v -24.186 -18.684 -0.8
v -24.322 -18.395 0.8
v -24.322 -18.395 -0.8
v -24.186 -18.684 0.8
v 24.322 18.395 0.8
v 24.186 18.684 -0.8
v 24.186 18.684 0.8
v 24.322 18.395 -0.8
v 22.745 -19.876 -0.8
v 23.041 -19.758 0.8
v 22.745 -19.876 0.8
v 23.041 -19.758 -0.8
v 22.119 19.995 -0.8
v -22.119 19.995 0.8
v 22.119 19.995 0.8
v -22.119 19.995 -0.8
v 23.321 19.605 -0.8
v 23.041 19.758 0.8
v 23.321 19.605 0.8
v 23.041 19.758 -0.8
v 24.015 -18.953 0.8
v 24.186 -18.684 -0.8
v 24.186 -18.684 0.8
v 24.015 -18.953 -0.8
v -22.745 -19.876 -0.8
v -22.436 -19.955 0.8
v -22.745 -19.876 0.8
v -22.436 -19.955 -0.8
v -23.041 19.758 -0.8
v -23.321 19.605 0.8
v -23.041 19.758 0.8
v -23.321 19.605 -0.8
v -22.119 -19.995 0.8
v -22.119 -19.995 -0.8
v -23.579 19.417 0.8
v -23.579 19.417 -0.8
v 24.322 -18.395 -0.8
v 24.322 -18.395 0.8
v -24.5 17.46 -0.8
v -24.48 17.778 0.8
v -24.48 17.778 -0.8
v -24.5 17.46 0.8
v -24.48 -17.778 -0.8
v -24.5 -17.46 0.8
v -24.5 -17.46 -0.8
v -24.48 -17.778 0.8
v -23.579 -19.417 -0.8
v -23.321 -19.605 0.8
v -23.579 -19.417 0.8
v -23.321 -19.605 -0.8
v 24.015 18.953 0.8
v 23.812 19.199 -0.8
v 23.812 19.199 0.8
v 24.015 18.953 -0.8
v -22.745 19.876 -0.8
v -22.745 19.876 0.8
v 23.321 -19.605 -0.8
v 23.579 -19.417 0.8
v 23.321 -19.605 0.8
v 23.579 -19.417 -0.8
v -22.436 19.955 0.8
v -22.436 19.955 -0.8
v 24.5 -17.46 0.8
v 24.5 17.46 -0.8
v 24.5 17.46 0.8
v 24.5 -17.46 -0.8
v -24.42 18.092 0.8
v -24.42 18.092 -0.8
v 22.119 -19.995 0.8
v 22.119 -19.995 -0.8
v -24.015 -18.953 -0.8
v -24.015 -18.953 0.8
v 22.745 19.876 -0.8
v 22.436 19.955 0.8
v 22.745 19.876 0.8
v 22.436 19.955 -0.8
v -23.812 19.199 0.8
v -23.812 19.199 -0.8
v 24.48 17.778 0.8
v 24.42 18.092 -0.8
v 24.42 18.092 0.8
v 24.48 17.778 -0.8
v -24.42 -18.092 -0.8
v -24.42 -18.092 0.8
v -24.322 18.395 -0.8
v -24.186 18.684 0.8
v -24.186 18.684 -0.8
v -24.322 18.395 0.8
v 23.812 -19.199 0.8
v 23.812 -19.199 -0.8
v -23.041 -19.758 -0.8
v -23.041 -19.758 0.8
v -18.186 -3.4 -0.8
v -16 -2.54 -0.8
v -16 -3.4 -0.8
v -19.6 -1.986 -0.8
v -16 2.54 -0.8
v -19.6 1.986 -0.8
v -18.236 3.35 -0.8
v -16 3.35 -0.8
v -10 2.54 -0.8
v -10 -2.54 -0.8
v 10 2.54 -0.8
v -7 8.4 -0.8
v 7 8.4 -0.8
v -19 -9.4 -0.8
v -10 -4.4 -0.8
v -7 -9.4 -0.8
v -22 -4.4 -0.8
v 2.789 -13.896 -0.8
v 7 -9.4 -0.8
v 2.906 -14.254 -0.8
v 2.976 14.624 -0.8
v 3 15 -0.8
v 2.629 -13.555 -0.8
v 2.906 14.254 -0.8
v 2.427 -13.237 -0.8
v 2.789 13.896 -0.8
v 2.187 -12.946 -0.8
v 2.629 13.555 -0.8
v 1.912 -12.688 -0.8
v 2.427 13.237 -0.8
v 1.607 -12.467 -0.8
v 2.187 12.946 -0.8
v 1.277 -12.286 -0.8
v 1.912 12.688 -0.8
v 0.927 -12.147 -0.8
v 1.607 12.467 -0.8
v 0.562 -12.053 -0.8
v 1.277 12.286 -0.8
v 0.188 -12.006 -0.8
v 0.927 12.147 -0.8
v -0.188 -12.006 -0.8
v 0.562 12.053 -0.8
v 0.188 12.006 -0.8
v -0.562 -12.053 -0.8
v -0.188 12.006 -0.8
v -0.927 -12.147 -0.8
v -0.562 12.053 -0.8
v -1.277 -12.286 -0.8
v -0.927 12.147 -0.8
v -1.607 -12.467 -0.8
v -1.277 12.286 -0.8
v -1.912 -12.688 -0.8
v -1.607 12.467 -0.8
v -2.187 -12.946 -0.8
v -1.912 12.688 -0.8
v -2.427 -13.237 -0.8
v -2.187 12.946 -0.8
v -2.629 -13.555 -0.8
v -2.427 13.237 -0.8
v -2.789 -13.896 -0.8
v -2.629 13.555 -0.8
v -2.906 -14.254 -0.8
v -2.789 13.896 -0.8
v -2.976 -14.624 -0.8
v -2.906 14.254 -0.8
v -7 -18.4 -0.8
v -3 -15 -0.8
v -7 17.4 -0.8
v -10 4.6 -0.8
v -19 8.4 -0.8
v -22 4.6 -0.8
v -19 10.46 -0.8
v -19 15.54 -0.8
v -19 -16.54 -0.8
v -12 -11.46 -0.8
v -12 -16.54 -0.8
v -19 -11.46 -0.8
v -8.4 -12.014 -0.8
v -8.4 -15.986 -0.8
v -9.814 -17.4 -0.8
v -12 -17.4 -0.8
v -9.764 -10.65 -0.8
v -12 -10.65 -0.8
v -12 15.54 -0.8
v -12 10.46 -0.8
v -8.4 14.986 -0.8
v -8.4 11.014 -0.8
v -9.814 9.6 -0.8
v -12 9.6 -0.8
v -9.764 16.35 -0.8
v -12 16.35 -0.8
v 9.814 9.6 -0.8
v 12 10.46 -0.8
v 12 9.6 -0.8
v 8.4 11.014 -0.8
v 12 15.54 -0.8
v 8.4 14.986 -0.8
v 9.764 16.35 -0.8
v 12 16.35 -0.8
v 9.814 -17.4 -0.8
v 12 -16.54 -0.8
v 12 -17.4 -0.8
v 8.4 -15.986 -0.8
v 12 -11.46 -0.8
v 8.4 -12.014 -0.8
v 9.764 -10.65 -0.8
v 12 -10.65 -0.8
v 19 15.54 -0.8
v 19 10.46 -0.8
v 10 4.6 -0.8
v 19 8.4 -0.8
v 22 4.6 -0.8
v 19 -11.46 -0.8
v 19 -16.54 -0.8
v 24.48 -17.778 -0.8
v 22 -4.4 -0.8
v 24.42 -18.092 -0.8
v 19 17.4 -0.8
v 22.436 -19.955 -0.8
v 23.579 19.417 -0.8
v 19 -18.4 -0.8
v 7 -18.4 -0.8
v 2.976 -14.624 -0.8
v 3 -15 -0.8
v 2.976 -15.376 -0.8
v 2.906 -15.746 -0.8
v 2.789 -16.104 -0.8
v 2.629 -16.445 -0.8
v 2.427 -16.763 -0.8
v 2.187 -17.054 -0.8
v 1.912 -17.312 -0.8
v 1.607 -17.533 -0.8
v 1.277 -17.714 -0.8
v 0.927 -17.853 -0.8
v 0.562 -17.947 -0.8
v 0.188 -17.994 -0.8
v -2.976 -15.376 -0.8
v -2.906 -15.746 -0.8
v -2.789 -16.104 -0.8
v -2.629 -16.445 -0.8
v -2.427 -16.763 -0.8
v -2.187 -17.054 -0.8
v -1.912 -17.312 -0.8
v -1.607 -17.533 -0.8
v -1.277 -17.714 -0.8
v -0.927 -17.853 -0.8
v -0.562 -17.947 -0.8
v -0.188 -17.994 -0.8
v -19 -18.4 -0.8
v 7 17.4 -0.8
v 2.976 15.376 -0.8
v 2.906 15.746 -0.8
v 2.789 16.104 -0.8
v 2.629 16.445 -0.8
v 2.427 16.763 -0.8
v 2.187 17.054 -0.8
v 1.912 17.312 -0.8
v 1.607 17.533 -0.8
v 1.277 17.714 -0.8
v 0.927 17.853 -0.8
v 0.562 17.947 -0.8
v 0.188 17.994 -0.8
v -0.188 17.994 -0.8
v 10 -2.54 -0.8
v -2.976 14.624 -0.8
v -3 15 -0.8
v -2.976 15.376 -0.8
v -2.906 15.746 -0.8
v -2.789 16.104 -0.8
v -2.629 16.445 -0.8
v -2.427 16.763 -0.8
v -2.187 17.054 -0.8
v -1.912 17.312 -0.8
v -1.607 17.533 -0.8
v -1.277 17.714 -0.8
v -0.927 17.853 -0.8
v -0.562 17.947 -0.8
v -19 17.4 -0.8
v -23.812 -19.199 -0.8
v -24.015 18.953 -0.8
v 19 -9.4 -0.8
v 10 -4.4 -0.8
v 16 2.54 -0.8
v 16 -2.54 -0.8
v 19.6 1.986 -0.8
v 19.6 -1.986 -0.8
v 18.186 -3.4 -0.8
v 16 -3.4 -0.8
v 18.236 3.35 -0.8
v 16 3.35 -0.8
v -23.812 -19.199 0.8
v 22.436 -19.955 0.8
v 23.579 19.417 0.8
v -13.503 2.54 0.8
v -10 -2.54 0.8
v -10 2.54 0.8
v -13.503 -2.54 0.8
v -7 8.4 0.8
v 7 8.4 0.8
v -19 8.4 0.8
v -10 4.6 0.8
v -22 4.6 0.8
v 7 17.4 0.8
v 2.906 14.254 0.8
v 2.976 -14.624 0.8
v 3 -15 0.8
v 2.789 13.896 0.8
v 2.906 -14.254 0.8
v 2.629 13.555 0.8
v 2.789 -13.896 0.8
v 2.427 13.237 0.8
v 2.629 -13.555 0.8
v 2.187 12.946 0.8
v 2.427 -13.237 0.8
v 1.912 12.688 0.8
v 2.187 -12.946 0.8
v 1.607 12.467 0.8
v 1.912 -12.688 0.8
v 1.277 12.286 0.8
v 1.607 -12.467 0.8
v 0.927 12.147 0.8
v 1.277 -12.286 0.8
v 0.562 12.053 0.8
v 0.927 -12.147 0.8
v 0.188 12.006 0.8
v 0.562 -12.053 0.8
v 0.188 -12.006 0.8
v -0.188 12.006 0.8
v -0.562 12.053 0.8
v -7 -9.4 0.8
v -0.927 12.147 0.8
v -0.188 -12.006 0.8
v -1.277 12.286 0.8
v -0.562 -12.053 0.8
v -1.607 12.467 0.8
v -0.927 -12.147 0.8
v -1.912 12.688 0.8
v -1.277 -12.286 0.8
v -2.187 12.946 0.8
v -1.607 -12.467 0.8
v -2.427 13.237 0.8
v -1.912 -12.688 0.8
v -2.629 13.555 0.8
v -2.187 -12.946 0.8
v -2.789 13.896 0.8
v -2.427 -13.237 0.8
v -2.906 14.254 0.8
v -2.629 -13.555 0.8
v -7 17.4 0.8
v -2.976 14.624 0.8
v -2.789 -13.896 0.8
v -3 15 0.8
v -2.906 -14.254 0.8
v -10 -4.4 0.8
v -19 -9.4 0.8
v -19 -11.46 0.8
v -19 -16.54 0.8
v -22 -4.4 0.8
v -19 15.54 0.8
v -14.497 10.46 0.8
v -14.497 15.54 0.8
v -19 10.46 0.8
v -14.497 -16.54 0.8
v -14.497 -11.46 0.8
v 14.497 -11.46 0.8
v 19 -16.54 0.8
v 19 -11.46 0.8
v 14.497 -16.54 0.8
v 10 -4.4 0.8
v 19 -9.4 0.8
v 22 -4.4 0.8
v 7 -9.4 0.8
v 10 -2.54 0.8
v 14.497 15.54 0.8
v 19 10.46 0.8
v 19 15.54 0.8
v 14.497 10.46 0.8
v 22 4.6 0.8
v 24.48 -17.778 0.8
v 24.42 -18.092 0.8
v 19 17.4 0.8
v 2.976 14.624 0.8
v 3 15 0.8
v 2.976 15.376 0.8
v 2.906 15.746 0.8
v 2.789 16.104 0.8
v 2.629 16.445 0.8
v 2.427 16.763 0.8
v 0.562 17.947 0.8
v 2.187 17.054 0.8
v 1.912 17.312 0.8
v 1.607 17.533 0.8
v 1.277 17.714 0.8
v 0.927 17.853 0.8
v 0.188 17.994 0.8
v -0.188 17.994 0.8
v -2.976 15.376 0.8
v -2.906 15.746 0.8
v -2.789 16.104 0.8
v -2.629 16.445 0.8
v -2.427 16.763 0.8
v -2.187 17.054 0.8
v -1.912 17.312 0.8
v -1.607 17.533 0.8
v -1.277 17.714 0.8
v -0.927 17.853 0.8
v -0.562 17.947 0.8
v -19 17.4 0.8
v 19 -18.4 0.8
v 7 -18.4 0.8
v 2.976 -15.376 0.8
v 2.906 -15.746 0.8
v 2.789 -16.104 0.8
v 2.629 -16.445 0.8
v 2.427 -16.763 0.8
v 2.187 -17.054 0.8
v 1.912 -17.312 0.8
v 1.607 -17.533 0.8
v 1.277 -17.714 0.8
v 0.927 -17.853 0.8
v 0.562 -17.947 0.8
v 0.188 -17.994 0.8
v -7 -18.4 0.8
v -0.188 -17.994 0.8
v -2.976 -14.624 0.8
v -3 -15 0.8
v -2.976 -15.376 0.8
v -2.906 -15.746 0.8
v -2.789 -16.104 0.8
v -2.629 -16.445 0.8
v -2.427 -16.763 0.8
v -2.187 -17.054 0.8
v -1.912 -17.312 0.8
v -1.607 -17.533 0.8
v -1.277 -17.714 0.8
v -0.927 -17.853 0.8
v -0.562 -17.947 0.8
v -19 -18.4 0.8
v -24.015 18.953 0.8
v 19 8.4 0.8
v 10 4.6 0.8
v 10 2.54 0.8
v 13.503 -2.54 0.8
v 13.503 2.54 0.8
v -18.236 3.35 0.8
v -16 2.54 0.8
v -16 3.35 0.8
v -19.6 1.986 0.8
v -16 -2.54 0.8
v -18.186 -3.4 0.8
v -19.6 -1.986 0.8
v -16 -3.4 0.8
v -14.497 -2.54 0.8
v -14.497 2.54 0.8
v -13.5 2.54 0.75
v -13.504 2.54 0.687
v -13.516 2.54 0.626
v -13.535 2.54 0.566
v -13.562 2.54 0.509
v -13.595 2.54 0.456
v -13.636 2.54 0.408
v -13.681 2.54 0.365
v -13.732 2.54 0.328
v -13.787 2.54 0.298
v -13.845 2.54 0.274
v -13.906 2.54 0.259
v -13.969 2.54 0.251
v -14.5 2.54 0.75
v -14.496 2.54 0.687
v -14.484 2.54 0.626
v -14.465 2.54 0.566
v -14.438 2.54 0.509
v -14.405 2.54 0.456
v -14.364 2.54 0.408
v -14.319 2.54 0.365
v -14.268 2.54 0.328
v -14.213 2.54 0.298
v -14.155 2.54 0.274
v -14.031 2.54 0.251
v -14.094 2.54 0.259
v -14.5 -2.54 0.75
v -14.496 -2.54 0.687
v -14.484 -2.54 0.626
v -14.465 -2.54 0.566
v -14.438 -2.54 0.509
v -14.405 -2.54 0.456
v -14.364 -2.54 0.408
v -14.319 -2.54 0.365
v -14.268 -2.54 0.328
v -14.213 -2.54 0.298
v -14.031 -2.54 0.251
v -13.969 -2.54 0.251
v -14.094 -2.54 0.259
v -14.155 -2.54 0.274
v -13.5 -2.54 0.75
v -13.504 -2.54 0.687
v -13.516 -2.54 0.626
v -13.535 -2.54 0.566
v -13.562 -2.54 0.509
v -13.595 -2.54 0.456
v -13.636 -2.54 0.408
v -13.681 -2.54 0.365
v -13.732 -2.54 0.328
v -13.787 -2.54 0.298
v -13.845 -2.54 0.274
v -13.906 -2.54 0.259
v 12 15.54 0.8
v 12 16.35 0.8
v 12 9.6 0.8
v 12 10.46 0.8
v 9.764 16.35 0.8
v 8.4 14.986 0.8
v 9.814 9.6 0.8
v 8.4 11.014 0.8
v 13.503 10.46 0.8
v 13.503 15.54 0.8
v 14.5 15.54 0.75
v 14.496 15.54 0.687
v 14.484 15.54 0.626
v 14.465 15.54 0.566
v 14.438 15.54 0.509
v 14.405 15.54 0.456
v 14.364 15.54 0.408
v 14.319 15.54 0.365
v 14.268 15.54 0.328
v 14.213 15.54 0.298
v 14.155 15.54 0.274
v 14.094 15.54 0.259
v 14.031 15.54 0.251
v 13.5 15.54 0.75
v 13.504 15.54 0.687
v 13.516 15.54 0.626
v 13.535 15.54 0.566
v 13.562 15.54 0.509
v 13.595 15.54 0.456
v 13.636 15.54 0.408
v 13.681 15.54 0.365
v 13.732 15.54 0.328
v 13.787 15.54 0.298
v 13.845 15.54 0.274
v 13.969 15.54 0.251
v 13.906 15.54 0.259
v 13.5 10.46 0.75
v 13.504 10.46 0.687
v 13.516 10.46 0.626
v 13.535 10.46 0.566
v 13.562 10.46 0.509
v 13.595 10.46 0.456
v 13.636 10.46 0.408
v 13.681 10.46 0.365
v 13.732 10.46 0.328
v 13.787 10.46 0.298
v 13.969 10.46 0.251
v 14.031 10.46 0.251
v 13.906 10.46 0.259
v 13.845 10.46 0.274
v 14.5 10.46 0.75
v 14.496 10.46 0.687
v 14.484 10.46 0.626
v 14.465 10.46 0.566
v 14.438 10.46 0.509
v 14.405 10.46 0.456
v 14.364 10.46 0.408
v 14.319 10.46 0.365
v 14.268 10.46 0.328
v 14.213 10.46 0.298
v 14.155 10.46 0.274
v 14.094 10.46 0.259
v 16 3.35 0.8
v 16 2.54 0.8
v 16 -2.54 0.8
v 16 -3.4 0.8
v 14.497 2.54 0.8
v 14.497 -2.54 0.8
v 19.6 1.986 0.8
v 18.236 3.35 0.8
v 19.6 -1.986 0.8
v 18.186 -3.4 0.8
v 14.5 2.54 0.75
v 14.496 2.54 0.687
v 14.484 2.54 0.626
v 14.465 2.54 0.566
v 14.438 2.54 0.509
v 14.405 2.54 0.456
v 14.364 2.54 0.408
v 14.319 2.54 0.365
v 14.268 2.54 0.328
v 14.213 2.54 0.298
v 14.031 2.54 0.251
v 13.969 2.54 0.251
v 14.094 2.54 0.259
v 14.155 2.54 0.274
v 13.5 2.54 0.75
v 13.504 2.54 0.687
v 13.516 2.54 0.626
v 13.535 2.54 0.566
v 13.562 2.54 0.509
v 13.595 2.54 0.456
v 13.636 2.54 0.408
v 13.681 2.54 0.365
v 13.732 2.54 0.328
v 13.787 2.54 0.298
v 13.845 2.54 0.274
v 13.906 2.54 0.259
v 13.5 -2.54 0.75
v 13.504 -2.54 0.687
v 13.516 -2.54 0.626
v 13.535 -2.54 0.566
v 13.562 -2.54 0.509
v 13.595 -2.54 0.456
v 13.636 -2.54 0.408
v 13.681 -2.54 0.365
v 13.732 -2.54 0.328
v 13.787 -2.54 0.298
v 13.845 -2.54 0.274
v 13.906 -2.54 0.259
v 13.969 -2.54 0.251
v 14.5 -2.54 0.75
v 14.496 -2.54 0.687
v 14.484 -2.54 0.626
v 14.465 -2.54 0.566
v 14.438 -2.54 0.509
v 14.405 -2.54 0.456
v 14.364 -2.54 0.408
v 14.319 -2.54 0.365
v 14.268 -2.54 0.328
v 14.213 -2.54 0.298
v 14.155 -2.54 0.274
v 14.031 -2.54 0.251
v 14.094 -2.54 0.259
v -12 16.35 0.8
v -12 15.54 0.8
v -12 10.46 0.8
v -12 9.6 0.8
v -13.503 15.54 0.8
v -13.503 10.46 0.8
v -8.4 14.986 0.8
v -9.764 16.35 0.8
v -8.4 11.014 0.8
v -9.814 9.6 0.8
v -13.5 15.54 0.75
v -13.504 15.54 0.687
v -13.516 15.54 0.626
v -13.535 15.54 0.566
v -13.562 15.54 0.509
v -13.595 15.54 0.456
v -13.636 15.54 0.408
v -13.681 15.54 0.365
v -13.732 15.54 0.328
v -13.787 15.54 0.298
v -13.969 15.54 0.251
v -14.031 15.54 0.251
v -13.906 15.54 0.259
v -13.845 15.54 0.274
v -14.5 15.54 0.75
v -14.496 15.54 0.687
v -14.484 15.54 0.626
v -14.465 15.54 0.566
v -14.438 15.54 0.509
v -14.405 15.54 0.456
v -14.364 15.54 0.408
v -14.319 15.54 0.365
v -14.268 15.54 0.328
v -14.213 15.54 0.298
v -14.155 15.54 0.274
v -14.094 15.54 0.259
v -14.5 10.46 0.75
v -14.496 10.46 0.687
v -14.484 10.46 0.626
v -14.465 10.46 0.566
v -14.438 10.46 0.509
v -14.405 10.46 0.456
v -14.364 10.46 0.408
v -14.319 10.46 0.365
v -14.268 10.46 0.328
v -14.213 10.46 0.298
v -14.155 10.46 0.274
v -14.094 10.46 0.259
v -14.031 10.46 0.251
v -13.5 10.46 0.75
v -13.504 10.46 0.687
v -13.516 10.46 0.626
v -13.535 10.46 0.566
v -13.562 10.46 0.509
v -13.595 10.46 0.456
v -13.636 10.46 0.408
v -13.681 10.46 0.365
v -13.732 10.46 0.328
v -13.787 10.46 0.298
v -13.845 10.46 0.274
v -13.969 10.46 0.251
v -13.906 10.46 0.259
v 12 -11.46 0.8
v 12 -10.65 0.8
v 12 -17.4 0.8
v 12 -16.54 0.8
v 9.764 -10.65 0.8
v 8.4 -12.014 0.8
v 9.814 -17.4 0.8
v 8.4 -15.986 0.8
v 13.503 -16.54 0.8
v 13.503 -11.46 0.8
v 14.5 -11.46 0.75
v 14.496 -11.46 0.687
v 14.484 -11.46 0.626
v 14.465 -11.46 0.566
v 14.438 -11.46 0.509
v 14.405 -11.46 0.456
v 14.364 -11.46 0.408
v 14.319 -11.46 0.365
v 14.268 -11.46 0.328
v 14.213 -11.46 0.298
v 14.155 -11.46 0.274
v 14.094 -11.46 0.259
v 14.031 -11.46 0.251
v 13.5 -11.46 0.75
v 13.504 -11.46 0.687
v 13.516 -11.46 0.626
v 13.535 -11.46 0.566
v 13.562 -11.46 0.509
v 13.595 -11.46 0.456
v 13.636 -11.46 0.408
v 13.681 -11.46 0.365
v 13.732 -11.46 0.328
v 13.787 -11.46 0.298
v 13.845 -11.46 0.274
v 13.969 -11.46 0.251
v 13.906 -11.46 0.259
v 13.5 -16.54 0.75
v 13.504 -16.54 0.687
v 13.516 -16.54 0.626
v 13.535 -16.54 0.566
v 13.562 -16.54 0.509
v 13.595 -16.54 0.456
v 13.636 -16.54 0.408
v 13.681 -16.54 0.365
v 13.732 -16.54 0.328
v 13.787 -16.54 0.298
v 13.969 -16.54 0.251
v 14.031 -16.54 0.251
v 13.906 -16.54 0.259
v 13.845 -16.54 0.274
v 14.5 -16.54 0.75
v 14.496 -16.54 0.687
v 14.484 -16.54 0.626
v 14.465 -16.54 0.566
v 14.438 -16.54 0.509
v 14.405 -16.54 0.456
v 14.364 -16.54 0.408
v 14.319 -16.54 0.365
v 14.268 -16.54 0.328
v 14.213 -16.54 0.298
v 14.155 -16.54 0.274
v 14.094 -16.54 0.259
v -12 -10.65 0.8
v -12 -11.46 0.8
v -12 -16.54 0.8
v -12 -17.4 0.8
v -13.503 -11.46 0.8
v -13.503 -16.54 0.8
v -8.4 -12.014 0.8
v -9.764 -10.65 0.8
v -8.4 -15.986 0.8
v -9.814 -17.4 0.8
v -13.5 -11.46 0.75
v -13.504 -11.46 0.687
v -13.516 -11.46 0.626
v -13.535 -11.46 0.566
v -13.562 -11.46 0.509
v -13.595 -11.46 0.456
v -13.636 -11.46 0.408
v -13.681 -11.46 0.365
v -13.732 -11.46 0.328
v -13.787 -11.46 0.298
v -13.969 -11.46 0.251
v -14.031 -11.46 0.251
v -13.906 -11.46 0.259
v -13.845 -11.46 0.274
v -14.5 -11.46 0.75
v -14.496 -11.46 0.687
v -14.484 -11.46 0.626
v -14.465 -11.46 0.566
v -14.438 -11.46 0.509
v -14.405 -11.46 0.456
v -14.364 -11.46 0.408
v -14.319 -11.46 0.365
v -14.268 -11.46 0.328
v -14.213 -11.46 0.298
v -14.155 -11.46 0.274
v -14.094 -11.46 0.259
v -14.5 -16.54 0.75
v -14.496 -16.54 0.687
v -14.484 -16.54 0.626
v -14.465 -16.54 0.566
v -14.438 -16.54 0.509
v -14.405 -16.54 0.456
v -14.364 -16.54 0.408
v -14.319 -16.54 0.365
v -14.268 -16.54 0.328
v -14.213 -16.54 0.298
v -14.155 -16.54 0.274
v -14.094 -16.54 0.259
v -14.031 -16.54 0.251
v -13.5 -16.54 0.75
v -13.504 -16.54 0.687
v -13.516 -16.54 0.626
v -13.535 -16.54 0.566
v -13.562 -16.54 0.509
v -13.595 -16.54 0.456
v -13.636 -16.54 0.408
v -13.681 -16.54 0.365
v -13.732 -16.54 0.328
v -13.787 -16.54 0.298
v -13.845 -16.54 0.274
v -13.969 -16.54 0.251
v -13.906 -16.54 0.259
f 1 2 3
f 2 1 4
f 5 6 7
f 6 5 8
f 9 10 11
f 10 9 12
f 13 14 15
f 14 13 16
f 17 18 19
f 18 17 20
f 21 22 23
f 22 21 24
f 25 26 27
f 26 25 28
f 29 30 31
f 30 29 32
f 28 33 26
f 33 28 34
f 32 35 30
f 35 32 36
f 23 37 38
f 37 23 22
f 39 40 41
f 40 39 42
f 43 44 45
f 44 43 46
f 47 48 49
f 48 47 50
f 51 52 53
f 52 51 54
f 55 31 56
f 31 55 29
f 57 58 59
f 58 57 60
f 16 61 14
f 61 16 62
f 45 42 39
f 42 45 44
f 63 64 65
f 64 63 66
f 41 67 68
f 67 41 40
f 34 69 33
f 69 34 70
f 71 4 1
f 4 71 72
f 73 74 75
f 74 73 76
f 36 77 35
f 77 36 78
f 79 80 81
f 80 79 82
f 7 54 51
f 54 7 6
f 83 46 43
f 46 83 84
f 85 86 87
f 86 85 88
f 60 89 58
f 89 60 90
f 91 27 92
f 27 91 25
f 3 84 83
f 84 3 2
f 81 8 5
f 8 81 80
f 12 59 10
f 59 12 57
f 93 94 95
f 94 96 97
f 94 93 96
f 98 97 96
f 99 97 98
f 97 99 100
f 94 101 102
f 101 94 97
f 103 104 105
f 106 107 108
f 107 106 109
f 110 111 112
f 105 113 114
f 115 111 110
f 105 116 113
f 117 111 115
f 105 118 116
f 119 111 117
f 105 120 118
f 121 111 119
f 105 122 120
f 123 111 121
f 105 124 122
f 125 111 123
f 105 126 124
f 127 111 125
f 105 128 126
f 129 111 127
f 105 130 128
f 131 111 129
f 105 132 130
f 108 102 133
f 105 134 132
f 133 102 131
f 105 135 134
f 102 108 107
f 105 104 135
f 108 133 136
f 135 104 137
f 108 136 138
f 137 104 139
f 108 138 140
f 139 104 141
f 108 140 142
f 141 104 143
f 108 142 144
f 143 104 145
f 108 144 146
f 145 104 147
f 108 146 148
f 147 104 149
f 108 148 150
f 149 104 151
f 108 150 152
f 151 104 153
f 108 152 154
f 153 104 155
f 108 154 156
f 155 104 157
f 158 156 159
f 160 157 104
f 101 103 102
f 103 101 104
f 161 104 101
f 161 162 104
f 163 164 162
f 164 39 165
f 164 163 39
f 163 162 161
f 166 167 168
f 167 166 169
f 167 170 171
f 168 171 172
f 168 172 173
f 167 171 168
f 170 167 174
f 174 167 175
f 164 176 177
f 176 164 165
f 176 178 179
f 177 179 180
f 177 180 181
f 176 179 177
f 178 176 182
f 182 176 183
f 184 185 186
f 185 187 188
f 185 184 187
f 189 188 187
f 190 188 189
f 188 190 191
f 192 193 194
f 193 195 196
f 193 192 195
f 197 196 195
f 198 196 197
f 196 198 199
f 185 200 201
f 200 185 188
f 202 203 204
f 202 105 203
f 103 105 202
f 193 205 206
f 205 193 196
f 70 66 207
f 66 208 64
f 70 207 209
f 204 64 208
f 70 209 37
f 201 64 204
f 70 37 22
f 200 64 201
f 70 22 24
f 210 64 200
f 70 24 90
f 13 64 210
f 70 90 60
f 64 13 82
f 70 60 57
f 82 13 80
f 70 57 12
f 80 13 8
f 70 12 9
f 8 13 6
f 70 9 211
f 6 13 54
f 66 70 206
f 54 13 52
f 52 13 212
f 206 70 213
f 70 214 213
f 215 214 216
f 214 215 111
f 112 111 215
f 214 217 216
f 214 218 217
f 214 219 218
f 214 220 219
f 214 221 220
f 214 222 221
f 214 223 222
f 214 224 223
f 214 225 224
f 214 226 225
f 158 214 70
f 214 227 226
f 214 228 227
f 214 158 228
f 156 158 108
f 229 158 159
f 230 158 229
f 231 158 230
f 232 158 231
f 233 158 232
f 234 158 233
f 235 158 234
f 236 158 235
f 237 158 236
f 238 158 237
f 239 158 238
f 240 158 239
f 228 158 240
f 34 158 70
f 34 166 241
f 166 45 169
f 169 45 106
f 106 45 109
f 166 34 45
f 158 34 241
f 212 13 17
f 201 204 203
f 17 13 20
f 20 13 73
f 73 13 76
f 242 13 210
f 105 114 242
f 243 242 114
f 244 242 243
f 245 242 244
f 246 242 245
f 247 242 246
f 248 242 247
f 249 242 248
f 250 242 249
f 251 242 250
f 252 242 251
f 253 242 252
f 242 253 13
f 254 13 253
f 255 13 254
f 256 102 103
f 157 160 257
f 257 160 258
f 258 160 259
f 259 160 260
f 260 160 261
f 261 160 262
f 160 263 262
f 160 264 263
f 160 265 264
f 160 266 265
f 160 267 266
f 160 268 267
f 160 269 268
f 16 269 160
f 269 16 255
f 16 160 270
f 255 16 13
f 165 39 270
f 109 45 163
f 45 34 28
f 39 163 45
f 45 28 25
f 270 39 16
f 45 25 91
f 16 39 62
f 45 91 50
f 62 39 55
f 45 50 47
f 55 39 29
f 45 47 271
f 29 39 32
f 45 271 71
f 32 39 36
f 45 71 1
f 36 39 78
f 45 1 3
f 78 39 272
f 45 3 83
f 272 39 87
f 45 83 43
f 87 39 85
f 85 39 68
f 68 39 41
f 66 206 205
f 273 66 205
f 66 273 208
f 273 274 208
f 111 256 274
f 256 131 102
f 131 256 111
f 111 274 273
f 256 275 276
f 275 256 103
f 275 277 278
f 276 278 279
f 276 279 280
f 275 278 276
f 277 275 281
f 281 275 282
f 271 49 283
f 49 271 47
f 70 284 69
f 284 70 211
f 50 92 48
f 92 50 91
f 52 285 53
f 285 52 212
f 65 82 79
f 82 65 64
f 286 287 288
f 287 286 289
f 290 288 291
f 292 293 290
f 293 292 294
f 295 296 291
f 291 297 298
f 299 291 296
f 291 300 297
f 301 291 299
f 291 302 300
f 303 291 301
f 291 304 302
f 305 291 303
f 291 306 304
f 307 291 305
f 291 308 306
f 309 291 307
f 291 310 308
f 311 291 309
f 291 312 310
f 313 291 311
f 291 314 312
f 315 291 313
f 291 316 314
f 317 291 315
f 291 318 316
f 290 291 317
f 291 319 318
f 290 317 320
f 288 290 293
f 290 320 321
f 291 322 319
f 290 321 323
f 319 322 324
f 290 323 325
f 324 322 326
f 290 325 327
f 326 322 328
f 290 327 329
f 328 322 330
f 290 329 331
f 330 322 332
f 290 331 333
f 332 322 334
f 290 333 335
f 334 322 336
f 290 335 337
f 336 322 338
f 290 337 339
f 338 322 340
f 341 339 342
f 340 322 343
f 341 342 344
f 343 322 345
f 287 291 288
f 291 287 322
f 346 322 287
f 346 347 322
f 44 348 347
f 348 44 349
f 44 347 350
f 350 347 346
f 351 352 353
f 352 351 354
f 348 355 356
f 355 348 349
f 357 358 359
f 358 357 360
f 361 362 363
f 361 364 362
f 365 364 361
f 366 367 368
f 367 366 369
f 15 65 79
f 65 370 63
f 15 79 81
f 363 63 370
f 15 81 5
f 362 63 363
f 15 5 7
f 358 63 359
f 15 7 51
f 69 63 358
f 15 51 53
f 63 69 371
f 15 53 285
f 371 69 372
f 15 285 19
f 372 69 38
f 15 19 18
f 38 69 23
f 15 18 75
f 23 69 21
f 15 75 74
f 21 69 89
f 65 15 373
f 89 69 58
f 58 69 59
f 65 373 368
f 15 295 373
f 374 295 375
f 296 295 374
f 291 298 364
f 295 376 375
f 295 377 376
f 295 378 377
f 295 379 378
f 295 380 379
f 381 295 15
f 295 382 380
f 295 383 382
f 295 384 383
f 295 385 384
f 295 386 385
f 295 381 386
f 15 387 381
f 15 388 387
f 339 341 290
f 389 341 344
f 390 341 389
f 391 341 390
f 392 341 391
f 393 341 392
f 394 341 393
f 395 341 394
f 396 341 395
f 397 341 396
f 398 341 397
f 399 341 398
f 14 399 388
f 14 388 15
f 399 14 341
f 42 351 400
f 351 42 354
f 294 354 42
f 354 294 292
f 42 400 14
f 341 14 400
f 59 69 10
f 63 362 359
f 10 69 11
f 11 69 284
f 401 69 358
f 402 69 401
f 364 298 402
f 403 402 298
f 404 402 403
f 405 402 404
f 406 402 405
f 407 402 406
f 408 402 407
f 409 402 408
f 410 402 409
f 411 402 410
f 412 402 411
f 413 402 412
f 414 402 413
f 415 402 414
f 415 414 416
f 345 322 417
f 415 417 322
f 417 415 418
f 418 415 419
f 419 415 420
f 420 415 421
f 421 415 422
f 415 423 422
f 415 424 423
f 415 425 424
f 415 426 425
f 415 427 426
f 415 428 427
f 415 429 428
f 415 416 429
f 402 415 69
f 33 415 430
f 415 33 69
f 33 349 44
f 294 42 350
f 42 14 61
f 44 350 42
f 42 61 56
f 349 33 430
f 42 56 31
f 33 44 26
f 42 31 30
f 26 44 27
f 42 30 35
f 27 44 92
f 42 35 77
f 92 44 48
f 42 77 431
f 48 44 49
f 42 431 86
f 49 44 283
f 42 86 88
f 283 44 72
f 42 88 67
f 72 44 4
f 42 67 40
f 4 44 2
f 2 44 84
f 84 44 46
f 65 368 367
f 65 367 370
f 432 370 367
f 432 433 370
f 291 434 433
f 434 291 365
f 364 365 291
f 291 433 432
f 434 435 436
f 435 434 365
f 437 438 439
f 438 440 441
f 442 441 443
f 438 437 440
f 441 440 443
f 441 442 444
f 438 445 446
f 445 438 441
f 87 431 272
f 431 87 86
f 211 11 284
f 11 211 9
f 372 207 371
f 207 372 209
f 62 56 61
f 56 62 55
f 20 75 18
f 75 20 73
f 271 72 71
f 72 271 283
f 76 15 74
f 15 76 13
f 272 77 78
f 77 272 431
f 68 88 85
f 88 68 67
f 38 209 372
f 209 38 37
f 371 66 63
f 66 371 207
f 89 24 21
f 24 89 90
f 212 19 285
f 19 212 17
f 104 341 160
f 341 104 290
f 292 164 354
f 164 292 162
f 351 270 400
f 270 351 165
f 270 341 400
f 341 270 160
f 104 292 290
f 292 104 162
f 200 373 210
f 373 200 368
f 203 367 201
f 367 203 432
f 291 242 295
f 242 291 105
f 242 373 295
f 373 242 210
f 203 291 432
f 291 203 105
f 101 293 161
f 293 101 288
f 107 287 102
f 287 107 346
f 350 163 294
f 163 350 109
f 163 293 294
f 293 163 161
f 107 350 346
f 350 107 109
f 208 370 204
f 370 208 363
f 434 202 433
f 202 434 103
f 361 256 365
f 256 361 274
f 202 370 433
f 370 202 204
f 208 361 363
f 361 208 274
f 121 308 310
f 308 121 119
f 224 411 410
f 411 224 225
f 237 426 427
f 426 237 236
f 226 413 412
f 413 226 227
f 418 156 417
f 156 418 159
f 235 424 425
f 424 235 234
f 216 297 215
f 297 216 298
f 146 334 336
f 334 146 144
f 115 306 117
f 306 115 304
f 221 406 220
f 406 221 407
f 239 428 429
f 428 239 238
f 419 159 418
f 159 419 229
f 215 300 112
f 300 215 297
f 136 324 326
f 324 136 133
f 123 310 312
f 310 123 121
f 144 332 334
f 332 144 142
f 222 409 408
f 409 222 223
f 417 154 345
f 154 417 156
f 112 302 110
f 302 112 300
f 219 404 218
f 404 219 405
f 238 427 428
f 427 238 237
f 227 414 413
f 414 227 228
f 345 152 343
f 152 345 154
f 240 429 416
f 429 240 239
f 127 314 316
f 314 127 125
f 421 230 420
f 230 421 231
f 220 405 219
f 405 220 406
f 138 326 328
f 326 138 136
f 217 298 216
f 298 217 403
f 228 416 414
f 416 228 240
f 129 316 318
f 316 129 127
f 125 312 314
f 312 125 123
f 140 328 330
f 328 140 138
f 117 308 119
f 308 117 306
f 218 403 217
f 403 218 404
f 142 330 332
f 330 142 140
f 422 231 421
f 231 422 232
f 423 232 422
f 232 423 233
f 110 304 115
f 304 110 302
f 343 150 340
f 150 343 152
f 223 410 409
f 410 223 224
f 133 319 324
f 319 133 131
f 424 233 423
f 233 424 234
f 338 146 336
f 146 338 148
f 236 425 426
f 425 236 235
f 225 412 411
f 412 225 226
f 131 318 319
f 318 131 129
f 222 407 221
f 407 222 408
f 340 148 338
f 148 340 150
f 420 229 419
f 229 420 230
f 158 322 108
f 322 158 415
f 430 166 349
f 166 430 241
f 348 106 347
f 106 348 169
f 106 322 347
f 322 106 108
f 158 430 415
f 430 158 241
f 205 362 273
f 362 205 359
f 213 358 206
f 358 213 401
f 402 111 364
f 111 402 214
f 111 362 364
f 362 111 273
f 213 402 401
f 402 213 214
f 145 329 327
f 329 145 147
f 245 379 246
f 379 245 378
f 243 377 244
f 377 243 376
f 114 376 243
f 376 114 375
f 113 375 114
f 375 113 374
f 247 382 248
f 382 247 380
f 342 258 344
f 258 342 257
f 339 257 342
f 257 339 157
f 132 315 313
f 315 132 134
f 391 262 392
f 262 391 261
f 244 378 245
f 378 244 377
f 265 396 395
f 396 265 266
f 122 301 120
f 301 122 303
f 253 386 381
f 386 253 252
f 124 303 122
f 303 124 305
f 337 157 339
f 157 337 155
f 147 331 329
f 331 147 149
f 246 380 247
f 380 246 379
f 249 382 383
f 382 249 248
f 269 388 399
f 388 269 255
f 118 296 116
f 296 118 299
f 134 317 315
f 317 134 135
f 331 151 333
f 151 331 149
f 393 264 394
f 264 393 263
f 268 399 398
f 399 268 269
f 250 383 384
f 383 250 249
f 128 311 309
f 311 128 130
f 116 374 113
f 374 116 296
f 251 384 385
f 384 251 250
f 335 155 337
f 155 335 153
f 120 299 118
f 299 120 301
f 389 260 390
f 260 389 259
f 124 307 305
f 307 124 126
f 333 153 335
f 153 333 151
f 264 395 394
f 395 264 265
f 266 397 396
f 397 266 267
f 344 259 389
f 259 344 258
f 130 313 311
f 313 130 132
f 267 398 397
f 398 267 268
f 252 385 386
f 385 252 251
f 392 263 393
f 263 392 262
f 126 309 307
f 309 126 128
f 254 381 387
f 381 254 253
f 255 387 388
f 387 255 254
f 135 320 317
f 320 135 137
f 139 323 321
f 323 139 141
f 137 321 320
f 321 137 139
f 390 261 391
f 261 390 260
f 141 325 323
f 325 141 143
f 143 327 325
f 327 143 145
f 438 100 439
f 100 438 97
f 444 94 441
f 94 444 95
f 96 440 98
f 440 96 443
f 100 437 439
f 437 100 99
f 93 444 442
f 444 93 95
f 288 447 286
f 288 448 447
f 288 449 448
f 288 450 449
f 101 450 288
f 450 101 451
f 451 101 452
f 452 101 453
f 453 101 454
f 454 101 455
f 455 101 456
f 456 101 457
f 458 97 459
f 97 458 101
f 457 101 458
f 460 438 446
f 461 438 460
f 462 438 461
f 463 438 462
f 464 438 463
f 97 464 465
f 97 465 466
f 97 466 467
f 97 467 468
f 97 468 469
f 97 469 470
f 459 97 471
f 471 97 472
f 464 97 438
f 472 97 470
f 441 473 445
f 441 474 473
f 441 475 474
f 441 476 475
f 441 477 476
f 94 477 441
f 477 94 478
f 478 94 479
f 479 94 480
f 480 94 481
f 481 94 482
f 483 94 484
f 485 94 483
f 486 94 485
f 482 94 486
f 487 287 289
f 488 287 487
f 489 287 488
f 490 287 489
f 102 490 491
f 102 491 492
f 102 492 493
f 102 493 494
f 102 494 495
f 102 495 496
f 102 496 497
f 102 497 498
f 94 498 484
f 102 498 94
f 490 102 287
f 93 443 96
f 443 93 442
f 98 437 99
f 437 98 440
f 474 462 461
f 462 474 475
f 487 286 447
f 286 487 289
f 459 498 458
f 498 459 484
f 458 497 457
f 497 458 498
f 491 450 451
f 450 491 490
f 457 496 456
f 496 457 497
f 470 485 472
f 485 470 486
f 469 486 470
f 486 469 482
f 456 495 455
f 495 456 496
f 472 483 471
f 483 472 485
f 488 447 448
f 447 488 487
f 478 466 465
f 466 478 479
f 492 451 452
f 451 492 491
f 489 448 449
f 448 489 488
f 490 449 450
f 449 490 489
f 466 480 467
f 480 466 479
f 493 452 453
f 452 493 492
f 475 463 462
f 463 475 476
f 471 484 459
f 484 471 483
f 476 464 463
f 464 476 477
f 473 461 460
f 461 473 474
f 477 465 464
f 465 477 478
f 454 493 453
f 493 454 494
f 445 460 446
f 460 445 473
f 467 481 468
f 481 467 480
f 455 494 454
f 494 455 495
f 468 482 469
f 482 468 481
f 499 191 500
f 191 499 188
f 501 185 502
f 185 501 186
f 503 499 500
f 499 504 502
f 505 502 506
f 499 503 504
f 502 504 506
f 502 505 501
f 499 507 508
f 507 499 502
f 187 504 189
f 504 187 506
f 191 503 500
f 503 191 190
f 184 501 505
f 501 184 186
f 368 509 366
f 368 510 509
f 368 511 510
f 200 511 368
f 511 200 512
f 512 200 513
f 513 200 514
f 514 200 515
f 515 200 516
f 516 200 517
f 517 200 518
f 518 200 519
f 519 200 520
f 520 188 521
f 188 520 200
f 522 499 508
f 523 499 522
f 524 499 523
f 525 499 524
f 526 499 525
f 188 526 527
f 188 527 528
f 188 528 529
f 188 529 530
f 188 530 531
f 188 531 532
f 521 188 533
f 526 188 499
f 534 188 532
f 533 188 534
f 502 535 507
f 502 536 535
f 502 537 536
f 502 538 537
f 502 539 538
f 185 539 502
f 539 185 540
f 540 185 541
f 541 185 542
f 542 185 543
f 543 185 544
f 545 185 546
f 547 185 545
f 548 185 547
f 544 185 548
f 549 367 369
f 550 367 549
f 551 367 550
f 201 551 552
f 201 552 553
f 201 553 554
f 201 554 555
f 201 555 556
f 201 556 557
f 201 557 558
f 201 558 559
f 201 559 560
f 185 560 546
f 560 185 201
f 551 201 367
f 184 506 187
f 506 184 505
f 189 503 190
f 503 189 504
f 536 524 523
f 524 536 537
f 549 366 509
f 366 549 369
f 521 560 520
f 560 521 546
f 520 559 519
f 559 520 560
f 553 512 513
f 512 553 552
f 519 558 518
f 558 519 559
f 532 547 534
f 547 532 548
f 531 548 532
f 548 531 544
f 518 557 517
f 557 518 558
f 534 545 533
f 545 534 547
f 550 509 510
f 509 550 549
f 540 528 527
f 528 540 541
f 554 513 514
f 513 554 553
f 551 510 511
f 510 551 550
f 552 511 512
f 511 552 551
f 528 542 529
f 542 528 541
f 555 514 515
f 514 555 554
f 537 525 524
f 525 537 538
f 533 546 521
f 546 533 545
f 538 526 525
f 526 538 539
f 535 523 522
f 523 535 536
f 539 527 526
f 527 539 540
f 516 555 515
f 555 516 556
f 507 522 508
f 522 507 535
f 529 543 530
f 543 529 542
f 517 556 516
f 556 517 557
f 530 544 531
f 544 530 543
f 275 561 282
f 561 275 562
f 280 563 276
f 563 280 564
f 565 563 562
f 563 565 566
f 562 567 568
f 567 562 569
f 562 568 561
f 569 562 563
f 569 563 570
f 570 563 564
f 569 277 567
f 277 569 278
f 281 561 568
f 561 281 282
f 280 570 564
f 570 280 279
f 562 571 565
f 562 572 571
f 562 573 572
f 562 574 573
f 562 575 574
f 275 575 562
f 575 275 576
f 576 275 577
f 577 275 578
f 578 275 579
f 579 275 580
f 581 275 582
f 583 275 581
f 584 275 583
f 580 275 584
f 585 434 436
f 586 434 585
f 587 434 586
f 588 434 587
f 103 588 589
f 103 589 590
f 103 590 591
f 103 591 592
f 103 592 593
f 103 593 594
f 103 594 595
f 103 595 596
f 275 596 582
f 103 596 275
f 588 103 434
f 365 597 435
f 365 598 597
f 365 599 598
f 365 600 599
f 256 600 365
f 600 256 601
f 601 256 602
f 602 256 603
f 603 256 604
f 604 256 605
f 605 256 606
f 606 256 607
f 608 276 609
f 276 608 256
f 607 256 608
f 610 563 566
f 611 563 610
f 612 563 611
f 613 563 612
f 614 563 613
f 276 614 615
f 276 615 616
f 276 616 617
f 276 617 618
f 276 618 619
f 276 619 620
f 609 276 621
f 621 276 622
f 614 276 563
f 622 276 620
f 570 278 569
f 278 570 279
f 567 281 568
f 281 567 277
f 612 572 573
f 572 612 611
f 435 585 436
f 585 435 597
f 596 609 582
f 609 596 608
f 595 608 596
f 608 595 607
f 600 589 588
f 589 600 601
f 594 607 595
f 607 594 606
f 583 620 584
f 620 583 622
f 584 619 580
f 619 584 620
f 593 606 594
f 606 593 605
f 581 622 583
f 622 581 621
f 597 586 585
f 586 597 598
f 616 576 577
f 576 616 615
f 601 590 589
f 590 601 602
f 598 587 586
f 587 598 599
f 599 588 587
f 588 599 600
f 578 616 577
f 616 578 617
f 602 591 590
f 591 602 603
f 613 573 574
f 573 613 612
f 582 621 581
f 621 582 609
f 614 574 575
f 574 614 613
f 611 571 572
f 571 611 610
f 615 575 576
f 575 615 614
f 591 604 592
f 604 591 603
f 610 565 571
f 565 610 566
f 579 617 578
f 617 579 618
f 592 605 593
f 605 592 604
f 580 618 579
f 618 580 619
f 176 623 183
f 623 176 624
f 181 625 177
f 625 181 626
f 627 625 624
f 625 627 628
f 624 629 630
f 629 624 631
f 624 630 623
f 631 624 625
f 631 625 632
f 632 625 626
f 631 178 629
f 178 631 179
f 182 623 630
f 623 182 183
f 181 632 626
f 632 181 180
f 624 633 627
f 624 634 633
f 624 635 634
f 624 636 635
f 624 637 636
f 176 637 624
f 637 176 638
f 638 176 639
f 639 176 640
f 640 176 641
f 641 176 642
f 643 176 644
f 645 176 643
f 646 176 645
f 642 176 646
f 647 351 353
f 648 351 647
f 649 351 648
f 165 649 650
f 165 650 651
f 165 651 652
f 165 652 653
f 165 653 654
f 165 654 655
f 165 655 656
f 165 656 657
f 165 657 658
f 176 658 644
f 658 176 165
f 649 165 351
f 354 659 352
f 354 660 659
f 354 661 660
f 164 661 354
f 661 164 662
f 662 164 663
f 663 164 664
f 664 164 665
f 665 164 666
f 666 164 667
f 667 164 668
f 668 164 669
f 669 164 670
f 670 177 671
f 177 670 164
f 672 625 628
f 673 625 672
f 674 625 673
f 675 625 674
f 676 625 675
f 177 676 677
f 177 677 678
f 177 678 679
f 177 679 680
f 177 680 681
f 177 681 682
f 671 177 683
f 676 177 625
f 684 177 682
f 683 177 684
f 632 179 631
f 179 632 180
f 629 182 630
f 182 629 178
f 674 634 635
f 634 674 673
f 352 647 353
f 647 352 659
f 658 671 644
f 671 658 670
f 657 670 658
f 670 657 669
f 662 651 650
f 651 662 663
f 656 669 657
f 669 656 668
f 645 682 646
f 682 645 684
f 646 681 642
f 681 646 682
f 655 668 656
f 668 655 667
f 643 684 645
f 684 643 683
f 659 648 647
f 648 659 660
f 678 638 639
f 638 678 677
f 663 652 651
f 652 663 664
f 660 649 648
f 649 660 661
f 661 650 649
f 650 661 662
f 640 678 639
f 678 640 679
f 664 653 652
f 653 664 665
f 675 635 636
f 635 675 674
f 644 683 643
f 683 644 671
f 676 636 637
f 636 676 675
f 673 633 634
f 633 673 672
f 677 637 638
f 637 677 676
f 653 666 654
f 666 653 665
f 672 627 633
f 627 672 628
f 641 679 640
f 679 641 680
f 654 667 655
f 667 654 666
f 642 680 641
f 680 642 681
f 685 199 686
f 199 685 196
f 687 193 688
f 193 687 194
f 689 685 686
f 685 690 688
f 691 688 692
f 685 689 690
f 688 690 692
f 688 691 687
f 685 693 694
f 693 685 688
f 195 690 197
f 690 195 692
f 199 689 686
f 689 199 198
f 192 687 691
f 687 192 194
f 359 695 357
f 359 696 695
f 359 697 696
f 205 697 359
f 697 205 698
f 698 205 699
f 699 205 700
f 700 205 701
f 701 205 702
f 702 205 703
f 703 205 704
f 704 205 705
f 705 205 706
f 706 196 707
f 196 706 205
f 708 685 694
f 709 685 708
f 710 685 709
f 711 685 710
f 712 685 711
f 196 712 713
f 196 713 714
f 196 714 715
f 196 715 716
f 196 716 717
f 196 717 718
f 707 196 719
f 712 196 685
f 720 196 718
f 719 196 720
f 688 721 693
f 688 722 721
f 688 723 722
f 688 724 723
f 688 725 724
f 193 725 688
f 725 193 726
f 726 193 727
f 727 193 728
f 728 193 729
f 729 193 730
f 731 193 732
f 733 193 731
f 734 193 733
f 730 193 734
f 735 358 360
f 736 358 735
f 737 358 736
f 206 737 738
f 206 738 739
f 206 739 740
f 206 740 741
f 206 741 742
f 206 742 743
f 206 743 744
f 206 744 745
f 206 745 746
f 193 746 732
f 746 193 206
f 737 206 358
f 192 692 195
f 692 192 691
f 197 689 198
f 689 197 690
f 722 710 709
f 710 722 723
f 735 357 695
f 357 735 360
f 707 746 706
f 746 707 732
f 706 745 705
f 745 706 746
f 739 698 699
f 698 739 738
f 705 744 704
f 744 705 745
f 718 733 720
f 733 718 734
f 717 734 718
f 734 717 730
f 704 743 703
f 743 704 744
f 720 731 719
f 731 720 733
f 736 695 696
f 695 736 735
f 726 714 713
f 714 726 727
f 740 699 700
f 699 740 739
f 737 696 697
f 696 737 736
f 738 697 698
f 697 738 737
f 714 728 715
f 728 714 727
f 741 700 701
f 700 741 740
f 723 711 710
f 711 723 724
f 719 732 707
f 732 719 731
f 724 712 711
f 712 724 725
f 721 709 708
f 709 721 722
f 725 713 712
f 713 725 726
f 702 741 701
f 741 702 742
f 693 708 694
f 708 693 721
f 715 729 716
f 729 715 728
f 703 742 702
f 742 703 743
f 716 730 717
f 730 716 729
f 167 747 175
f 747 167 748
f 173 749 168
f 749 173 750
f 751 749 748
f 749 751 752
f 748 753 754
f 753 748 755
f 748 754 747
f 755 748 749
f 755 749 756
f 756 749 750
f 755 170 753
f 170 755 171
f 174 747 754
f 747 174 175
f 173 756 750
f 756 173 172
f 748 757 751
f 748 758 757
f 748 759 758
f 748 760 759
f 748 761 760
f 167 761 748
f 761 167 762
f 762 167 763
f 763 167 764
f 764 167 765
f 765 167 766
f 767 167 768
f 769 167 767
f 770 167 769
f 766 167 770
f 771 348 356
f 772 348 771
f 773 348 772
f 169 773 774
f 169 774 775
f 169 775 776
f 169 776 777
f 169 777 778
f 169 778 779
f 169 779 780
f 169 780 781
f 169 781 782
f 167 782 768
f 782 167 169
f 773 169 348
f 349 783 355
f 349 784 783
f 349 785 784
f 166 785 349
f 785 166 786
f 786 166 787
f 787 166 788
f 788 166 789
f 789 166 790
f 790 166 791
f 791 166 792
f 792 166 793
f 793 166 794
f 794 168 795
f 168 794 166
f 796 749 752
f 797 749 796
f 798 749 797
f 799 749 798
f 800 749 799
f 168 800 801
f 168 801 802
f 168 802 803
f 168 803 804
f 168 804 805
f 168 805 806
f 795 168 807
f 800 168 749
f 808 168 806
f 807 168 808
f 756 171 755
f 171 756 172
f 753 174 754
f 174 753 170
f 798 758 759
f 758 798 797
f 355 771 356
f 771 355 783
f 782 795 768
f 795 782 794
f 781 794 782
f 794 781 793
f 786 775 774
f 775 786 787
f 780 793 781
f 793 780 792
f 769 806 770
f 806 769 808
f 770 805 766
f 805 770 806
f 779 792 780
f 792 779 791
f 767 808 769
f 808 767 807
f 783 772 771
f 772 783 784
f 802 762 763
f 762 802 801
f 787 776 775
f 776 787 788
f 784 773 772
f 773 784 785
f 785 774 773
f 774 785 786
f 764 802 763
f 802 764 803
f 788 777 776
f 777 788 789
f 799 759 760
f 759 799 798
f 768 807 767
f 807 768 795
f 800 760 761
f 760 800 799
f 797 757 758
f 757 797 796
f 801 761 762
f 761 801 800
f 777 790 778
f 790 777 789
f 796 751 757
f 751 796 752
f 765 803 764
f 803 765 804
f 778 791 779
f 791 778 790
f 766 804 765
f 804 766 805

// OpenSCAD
ecartement=28; // ecartement fil - wire spacer
epaisseur=1.5; //epaisseur plaque

$fn=50;
rayon=2.54;
largeur=40;
union(){

    difference(){
        union(){
            minkowski(){
                translate([0,0,0])cube([ecartement+21-2*rayon,largeur-2*rayon,epaisseur], center=true);
                cylinder(r=rayon, h=0.1, center=true);
                }
            }
            
            
        // trou fixation haut
        translate([-(ecartement/2)-5,8.4,-epaisseur/2-0.1])cube([12,9,epaisseur+0.2]);
        translate([(ecartement/2)-7,8.4,-epaisseur/2-0.1])cube([12,9,epaisseur+0.2]);
 
        // trou fixation moyen
        translate([-(ecartement/2)-8,-4.4,-epaisseur/2-0.1])cube([12,9,epaisseur+0.2]);
        translate([(ecartement/2)-4,-4.4,-epaisseur/2-0.1])cube([12,9,epaisseur+0.2]);

  
        // trou fixation bas
        translate([0,-15,0])cylinder(d=6, h=epaisseur*2, center=true);
        translate([-(ecartement/2)-5,-18.4,-epaisseur/2-0.1])cube([12,9,epaisseur+0.2]);
        translate([(ecartement/2)-7,-18.4,-epaisseur/2-0.1])cube([12,9,epaisseur+0.2]);

          
        translate([0,15,0])cylinder(d=6, h=epaisseur*2, center=true);
    }
    // fixation haut
    translate([ecartement,13,0])fixation();
    translate([-ecartement,13,0])mirror([1,0,0])fixation();

    // fixation moyen
    fixation();
    mirror([1,0,0])fixation();

    // fixation bas
    translate([ecartement,-14,0])fixation();
    translate([-ecartement,-14,0])mirror([1,0,0])fixation();

    


    }


//***********************************************

module fixation(){
    difference(){
        union(){
        translate([-(ecartement/2)-5.6,-3.40,-epaisseur/2-0.05])cube([3.6,6.75,epaisseur+.1]);
        translate([-(ecartement/2)-3.5,-2.54,-epaisseur/2-0.05])cube([9,5.08,epaisseur+.1]);
        } // piece de maintien
        union(){
            translate([-(ecartement/2)-5.6,-3.40,0])rotate([0,0,45])cube([2,2,epaisseur+2], center=true);
            translate([-(ecartement/2)-5.6,3.40,0])rotate([0,0,45])cube([2,2,epaisseur+2], center=true);
            translate([-ecartement/2,0,epaisseur/2])rotate([90,0,0])cylinder(d=epaisseur-0.5, h=6, center=true);
        }// chanfreins et passe cable
    }
}

module troucable(){
    difference(){
        cylinder(r=rayon, h=epaisseur+1, center=true);
        rotate_extrude () translate([rayon*25,0,0]) circle (rayon*2, $fn=100);
    }
}
